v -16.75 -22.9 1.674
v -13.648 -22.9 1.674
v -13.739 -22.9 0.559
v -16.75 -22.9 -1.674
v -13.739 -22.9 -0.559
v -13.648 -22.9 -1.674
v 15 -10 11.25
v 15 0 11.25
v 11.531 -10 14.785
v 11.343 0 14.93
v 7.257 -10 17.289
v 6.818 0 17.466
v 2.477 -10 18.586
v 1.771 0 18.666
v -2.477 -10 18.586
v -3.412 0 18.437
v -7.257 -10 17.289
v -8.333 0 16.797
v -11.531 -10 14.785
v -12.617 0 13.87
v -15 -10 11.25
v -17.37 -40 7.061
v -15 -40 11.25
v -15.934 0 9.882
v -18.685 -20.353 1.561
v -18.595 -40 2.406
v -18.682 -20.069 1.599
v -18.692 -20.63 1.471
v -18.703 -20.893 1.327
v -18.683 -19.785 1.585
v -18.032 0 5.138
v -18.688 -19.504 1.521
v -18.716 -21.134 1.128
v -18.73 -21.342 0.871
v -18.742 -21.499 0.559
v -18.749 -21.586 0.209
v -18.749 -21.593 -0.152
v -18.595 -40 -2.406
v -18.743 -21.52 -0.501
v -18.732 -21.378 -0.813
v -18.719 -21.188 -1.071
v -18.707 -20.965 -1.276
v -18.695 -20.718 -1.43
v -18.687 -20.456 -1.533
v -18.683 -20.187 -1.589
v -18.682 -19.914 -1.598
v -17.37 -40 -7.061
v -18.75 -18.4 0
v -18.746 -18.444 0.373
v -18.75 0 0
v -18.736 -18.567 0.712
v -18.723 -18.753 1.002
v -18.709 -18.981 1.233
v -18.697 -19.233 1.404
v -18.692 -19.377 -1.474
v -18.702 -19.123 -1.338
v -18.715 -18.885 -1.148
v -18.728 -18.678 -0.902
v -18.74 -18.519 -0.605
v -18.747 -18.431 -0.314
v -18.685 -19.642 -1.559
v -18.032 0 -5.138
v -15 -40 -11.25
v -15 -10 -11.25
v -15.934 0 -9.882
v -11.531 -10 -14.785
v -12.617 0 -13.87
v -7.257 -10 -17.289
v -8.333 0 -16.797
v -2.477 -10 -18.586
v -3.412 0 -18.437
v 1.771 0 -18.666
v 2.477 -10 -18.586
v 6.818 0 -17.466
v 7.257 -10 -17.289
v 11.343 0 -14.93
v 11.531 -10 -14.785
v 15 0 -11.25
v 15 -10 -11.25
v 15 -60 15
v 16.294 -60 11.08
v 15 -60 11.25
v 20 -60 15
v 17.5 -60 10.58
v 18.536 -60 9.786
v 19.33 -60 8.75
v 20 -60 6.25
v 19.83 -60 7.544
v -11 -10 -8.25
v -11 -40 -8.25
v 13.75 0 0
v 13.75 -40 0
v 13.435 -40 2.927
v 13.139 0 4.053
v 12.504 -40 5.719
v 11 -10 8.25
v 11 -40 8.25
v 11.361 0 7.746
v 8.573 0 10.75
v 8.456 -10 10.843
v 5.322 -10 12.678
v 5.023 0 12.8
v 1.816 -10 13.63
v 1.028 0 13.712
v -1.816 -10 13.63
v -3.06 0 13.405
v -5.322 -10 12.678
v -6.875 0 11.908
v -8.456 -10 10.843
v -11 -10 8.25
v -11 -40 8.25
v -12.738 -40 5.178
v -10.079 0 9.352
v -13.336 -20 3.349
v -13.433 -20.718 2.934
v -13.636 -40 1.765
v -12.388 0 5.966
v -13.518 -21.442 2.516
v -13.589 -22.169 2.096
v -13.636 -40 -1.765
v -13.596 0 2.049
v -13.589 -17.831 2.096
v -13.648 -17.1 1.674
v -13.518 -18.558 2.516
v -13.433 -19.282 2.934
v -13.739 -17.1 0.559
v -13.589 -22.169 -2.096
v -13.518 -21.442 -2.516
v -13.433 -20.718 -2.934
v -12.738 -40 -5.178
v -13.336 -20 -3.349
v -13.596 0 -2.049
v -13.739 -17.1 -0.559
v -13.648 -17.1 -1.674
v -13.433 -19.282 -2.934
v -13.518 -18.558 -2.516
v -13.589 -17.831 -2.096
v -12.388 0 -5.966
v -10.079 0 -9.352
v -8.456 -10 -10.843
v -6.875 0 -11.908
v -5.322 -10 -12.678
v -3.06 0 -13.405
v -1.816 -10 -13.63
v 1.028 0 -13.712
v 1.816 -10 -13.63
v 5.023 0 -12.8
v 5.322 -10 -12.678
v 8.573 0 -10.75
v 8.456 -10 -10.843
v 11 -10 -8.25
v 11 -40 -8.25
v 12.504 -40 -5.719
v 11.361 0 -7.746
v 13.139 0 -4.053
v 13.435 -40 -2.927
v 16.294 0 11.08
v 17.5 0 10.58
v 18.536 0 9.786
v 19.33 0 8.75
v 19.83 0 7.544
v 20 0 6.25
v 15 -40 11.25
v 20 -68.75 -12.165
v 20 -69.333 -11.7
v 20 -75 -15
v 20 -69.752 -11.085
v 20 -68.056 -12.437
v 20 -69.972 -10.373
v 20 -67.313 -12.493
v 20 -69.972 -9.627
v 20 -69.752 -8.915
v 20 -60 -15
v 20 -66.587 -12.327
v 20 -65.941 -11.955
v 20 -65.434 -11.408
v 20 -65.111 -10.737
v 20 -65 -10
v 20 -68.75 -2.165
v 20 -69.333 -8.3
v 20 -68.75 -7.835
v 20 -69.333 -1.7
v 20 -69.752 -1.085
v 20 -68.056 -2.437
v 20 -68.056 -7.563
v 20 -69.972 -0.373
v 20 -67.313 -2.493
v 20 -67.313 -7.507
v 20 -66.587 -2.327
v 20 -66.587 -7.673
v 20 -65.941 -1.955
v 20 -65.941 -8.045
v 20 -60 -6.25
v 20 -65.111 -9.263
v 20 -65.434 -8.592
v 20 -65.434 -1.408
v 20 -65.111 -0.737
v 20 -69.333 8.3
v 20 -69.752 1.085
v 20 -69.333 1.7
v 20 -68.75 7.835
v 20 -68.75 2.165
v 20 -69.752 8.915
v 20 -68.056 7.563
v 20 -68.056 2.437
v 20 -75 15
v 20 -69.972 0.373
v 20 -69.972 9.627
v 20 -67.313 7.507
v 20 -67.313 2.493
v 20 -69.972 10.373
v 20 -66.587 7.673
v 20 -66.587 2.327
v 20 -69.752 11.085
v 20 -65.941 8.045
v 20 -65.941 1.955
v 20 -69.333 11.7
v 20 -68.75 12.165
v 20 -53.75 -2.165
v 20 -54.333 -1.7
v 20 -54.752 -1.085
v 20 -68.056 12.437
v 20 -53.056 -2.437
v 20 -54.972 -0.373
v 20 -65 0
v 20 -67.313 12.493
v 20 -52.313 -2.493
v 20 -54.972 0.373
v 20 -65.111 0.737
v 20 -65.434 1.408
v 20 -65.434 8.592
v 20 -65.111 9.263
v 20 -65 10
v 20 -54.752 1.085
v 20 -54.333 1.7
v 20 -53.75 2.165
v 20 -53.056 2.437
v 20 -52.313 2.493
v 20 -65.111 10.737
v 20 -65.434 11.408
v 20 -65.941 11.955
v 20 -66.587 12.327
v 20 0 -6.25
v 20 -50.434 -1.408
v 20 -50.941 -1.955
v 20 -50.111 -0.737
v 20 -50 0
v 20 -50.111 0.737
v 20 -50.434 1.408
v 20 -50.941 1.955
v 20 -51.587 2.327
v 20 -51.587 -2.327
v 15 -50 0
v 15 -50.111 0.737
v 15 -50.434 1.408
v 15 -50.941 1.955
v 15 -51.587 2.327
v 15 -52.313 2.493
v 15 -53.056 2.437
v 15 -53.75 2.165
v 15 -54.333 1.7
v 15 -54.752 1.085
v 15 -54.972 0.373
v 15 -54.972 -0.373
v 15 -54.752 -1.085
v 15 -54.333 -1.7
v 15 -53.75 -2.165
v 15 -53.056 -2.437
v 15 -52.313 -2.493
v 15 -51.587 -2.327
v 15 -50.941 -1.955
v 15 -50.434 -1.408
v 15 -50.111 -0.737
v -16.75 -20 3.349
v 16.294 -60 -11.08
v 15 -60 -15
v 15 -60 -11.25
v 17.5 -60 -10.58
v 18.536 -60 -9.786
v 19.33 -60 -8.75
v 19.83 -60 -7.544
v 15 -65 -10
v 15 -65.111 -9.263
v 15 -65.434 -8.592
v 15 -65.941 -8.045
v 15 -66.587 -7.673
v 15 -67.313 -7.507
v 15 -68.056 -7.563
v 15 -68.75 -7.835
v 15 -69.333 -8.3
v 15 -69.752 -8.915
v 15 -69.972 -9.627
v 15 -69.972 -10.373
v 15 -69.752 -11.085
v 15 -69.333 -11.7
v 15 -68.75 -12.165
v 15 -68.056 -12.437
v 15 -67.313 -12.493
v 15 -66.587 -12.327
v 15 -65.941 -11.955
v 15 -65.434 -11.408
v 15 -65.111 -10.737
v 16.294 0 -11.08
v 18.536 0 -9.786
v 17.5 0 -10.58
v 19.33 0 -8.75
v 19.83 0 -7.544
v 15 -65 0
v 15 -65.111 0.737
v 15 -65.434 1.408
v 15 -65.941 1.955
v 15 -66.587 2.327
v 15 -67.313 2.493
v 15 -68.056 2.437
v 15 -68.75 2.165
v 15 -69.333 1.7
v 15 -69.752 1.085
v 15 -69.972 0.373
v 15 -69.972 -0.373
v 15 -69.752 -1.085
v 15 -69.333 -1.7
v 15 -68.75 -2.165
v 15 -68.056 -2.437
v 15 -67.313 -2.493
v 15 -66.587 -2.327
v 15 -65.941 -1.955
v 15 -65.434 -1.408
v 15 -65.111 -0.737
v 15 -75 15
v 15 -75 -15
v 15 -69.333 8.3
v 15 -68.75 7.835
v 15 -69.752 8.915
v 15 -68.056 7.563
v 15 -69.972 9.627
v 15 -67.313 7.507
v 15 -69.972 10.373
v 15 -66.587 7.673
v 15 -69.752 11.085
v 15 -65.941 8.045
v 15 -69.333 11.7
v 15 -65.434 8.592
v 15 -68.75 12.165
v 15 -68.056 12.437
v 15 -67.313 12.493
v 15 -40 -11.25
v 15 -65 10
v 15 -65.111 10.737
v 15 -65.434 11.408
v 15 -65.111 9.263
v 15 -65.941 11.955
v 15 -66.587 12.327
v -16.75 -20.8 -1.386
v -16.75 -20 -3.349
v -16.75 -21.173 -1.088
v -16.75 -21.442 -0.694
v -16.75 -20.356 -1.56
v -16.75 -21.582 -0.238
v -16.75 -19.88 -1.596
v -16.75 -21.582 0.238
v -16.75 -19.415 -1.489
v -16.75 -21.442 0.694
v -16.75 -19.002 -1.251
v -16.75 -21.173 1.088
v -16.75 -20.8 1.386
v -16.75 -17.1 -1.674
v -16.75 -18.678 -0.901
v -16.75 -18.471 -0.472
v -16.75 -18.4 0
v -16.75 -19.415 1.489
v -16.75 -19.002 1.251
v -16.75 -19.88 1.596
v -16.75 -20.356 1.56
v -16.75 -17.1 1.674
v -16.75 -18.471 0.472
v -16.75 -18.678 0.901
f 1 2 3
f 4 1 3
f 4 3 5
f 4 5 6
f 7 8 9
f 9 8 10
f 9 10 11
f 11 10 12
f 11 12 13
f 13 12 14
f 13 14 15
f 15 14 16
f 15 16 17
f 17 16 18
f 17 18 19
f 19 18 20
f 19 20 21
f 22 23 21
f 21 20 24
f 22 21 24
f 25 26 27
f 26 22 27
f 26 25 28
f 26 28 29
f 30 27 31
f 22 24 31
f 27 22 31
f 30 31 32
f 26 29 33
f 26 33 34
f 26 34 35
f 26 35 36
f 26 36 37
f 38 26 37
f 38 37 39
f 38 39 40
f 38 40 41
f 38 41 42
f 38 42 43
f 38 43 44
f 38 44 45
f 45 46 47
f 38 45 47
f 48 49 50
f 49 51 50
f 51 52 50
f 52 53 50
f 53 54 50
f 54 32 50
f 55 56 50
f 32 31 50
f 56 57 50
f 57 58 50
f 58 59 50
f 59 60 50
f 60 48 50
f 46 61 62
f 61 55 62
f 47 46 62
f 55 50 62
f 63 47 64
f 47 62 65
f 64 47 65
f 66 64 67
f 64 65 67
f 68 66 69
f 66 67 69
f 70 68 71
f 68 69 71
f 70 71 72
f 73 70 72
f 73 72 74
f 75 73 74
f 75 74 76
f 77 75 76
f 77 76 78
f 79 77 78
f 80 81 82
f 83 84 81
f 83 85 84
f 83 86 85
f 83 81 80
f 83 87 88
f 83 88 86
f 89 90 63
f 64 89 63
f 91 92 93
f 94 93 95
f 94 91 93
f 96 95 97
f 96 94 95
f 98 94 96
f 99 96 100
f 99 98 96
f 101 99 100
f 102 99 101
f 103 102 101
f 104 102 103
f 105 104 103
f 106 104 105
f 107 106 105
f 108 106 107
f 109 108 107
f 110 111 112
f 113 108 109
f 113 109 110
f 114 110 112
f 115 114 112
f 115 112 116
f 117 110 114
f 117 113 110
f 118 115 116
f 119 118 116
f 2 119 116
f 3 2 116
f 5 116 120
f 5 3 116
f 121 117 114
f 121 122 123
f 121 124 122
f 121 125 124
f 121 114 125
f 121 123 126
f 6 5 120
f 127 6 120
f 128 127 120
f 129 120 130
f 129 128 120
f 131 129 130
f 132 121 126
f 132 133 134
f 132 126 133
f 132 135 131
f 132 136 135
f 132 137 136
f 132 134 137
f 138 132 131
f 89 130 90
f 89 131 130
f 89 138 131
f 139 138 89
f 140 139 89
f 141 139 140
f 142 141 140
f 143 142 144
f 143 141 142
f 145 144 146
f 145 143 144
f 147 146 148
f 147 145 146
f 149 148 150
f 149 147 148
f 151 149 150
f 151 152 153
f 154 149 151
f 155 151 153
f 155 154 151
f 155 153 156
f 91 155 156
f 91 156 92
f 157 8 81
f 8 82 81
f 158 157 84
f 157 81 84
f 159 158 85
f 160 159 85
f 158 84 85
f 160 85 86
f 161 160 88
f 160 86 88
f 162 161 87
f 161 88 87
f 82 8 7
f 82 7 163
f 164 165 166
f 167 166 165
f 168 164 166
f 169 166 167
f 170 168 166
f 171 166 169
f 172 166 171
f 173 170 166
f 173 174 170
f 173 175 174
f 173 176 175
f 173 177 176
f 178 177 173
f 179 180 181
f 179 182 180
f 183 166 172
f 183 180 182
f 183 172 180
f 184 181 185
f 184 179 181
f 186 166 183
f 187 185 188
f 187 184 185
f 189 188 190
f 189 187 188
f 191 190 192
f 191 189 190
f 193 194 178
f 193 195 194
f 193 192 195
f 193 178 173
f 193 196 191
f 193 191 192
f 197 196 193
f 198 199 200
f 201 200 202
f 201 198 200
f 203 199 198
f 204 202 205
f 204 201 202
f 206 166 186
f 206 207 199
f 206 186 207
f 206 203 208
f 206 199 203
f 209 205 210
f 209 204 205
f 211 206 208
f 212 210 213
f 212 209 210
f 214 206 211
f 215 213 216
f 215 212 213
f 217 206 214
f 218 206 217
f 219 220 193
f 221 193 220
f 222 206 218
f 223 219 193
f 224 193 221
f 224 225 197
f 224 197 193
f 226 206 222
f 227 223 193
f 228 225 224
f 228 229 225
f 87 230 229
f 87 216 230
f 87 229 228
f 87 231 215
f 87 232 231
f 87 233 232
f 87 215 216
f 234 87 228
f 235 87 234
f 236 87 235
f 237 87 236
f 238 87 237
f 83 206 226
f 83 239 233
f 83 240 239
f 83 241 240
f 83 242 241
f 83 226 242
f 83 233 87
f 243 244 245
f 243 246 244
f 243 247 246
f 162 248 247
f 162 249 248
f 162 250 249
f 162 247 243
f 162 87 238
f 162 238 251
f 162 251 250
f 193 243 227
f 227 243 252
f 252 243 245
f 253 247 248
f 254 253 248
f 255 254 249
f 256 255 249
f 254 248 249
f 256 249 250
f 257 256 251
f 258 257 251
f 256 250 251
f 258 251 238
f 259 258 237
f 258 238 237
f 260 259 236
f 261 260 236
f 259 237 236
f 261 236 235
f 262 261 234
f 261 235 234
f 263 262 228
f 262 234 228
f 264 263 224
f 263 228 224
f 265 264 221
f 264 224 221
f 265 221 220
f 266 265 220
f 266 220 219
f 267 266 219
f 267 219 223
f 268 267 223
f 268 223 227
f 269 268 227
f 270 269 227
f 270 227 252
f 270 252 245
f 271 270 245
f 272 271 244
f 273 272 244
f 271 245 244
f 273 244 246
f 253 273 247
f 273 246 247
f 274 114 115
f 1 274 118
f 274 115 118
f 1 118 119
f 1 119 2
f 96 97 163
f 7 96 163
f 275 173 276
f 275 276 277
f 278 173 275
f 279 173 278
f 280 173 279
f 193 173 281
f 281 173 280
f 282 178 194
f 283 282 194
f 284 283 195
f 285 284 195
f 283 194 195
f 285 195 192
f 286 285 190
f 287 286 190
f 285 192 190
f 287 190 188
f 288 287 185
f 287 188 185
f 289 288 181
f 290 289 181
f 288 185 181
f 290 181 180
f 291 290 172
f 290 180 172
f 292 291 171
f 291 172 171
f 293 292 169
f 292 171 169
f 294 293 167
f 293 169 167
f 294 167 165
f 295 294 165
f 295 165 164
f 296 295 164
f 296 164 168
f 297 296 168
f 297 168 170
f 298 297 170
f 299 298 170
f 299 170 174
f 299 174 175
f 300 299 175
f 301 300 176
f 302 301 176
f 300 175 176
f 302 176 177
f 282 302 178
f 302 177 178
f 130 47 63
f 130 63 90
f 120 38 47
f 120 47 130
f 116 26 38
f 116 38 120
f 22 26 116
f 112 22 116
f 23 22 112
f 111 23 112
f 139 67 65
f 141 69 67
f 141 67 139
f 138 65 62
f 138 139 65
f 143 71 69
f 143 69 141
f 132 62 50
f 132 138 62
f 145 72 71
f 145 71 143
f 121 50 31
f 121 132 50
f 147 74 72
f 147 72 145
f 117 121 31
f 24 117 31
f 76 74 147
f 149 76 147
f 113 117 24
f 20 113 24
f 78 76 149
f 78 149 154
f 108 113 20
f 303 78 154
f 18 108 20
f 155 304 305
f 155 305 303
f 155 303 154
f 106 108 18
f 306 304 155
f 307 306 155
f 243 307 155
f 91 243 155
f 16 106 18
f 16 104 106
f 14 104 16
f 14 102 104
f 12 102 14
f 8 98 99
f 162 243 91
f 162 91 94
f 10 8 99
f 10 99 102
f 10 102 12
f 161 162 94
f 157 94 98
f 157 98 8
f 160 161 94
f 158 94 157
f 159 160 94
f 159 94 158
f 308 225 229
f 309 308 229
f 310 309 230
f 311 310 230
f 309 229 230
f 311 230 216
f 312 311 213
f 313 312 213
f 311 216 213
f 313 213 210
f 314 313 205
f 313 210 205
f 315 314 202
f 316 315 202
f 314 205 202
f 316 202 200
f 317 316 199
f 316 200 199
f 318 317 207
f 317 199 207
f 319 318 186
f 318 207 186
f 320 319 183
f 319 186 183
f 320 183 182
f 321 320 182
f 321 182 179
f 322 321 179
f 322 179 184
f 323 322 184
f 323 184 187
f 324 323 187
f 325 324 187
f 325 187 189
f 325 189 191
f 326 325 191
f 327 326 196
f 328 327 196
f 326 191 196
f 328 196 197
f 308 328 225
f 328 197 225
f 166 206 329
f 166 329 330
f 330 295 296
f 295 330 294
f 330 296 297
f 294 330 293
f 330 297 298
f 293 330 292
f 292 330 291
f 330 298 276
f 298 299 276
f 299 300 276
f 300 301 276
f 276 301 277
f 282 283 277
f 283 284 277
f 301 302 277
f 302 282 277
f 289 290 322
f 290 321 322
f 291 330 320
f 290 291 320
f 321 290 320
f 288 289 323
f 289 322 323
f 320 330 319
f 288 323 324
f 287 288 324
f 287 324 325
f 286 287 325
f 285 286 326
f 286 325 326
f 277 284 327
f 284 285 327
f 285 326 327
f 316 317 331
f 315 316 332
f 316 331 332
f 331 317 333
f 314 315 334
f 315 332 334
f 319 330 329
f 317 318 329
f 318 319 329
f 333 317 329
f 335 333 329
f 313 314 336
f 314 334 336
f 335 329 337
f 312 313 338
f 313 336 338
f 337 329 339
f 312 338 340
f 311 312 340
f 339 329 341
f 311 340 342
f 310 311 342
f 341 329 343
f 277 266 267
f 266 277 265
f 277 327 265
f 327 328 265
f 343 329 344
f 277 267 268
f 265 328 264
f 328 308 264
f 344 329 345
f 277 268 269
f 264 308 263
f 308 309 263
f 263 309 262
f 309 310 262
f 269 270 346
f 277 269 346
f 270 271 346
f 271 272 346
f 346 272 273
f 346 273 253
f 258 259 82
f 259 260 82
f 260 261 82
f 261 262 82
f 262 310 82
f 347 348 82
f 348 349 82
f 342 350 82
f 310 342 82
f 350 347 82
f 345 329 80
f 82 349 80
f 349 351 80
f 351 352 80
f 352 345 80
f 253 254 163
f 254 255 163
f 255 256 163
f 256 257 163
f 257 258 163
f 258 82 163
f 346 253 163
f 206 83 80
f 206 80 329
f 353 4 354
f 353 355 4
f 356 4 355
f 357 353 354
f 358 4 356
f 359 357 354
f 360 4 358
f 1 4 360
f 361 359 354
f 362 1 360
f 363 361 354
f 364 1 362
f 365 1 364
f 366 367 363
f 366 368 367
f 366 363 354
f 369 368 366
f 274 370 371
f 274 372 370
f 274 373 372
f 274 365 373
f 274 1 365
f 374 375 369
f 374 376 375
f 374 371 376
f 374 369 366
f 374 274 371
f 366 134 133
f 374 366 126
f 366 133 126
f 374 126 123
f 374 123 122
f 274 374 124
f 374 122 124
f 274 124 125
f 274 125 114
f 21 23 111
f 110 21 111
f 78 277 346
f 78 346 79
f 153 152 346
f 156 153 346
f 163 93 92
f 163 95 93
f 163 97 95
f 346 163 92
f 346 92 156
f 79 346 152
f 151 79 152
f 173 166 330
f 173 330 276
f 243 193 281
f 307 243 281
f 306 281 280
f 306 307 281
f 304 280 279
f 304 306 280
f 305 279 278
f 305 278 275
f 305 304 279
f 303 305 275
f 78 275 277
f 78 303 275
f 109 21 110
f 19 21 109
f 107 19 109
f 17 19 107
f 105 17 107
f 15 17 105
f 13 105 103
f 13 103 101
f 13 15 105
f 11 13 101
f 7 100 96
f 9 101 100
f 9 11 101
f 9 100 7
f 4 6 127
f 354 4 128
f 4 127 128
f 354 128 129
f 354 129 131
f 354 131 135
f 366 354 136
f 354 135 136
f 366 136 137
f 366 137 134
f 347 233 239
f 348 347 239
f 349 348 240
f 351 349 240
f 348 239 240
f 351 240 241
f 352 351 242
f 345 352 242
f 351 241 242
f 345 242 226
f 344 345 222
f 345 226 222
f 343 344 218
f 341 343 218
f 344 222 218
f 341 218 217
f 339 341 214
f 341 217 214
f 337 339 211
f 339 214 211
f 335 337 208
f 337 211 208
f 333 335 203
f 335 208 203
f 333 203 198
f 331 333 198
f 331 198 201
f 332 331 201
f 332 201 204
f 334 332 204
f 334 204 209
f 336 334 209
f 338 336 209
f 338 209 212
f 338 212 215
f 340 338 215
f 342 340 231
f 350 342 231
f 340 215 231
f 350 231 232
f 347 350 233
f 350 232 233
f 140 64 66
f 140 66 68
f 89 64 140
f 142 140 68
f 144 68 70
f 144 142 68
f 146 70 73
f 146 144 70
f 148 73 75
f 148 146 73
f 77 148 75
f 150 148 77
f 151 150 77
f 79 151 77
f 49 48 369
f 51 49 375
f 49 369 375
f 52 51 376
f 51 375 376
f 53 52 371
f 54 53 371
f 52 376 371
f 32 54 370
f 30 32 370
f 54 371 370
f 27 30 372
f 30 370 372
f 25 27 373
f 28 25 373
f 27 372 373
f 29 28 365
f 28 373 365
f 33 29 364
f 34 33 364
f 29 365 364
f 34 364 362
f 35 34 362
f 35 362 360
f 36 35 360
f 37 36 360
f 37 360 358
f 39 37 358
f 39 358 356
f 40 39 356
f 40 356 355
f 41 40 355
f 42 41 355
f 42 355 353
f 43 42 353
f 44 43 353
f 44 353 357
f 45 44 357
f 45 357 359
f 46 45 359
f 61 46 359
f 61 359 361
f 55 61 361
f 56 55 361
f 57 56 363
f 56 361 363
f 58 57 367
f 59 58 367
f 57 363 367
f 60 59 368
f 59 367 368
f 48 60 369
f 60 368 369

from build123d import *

# Parameters (mm, degrees)
F0_R     = 18.75
F0_R_2   = 13.75
F1_DEPTH = 40
F3_DEPTH = 30
F4_R     = 1.6
F5_DEPTH = 19.750000113
F6_DEPTH = 16.75
F8_R     = 2.5
F9_DEPTH = 5
F10_R    = 4.99999


# Not quite as in the source:
# - a fillet or chamfer is up to 0.001 mm smaller than in the source, because OpenCascade refuses the exact size


with BuildPart() as f1:
    # F0 (on Front) → F1 (new body)
    with BuildSketch(Plane.XZ):
        Circle(F0_R)
        Circle(F0_R_2, mode=Mode.SUBTRACT)
    extrude(amount=F1_DEPTH)

    # F2 (on face) → F3 (cut)
    with BuildSketch(Plane.XZ.offset(40)):
        with BuildLine():
            ThreePointArc((-11, 8.25), (0, 13.75), (11, 8.25))
            Line((11, 8.25), (15, 11.25))
            ThreePointArc((15, 11.25), (0, 18.75), (-15, 11.25))
            Line((-15, 11.25), (-11, 8.25))
        make_face()
        with BuildLine():
            Line((15, -11.25), (11, -8.25))
            ThreePointArc((11, -8.25), (0, -13.75), (-11, -8.25))
            Line((-11, -8.25), (-15, -11.25))
            ThreePointArc((-15, -11.25), (0, -18.75), (15, -11.25))
        make_face()
    extrude(amount=-F3_DEPTH, mode=Mode.SUBTRACT)

    # F4 (on Right) → F5 (cut, up to face)
    with BuildSketch(Plane.YZ):
        with Locations((-20, 0)):
            Circle(F4_R)
    extrude(amount=-F5_DEPTH, mode=Mode.SUBTRACT)

    # F4 (on Right) → F6 (cut)
    with BuildSketch(Plane.YZ):
        Polygon((-22.9, 1.6743157806), (-22.9, -1.6743157806), (-20, -3.3486315613), (-17.1, -1.6743157806), (-17.1, 1.6743157806), (-20, 3.3486315613), align=None)
        with Locations((-20, 0)):
            Circle(F4_R, mode=Mode.SUBTRACT)
    extrude(amount=-F6_DEPTH, mode=Mode.SUBTRACT)

    # F8 (on offset) → F9 (join)
    with BuildSketch(Plane.YZ.offset(20)):
        Polygon((0, 11.25), (-60, 11.25), (-60, 15), (-75, 15), (-75, -15), (-60, -15), (-60, -11.25), (0, -11.25), align=None)
        with Locations((-67.5, -10)):
            Circle(F8_R, mode=Mode.SUBTRACT)
        with Locations((-67.5, 0)):
            Circle(F8_R, mode=Mode.SUBTRACT)
        with Locations((-52.5, 0)):
            Circle(F8_R, mode=Mode.SUBTRACT)
        with Locations((-67.5, 10)):
            Circle(F8_R, mode=Mode.SUBTRACT)
    extrude(amount=-F9_DEPTH)

    # F10 (radius 5 in the source; OpenCascade refuses exactly that, so slightly less here)
    f10_edges = [f1.edges().sort_by_distance(p)[0] for p in [
        (20, -30, 11.25),
        (20, -30, -11.25),
    ]]
    fillet(f10_edges, radius=F10_R)


solid = f1.part
